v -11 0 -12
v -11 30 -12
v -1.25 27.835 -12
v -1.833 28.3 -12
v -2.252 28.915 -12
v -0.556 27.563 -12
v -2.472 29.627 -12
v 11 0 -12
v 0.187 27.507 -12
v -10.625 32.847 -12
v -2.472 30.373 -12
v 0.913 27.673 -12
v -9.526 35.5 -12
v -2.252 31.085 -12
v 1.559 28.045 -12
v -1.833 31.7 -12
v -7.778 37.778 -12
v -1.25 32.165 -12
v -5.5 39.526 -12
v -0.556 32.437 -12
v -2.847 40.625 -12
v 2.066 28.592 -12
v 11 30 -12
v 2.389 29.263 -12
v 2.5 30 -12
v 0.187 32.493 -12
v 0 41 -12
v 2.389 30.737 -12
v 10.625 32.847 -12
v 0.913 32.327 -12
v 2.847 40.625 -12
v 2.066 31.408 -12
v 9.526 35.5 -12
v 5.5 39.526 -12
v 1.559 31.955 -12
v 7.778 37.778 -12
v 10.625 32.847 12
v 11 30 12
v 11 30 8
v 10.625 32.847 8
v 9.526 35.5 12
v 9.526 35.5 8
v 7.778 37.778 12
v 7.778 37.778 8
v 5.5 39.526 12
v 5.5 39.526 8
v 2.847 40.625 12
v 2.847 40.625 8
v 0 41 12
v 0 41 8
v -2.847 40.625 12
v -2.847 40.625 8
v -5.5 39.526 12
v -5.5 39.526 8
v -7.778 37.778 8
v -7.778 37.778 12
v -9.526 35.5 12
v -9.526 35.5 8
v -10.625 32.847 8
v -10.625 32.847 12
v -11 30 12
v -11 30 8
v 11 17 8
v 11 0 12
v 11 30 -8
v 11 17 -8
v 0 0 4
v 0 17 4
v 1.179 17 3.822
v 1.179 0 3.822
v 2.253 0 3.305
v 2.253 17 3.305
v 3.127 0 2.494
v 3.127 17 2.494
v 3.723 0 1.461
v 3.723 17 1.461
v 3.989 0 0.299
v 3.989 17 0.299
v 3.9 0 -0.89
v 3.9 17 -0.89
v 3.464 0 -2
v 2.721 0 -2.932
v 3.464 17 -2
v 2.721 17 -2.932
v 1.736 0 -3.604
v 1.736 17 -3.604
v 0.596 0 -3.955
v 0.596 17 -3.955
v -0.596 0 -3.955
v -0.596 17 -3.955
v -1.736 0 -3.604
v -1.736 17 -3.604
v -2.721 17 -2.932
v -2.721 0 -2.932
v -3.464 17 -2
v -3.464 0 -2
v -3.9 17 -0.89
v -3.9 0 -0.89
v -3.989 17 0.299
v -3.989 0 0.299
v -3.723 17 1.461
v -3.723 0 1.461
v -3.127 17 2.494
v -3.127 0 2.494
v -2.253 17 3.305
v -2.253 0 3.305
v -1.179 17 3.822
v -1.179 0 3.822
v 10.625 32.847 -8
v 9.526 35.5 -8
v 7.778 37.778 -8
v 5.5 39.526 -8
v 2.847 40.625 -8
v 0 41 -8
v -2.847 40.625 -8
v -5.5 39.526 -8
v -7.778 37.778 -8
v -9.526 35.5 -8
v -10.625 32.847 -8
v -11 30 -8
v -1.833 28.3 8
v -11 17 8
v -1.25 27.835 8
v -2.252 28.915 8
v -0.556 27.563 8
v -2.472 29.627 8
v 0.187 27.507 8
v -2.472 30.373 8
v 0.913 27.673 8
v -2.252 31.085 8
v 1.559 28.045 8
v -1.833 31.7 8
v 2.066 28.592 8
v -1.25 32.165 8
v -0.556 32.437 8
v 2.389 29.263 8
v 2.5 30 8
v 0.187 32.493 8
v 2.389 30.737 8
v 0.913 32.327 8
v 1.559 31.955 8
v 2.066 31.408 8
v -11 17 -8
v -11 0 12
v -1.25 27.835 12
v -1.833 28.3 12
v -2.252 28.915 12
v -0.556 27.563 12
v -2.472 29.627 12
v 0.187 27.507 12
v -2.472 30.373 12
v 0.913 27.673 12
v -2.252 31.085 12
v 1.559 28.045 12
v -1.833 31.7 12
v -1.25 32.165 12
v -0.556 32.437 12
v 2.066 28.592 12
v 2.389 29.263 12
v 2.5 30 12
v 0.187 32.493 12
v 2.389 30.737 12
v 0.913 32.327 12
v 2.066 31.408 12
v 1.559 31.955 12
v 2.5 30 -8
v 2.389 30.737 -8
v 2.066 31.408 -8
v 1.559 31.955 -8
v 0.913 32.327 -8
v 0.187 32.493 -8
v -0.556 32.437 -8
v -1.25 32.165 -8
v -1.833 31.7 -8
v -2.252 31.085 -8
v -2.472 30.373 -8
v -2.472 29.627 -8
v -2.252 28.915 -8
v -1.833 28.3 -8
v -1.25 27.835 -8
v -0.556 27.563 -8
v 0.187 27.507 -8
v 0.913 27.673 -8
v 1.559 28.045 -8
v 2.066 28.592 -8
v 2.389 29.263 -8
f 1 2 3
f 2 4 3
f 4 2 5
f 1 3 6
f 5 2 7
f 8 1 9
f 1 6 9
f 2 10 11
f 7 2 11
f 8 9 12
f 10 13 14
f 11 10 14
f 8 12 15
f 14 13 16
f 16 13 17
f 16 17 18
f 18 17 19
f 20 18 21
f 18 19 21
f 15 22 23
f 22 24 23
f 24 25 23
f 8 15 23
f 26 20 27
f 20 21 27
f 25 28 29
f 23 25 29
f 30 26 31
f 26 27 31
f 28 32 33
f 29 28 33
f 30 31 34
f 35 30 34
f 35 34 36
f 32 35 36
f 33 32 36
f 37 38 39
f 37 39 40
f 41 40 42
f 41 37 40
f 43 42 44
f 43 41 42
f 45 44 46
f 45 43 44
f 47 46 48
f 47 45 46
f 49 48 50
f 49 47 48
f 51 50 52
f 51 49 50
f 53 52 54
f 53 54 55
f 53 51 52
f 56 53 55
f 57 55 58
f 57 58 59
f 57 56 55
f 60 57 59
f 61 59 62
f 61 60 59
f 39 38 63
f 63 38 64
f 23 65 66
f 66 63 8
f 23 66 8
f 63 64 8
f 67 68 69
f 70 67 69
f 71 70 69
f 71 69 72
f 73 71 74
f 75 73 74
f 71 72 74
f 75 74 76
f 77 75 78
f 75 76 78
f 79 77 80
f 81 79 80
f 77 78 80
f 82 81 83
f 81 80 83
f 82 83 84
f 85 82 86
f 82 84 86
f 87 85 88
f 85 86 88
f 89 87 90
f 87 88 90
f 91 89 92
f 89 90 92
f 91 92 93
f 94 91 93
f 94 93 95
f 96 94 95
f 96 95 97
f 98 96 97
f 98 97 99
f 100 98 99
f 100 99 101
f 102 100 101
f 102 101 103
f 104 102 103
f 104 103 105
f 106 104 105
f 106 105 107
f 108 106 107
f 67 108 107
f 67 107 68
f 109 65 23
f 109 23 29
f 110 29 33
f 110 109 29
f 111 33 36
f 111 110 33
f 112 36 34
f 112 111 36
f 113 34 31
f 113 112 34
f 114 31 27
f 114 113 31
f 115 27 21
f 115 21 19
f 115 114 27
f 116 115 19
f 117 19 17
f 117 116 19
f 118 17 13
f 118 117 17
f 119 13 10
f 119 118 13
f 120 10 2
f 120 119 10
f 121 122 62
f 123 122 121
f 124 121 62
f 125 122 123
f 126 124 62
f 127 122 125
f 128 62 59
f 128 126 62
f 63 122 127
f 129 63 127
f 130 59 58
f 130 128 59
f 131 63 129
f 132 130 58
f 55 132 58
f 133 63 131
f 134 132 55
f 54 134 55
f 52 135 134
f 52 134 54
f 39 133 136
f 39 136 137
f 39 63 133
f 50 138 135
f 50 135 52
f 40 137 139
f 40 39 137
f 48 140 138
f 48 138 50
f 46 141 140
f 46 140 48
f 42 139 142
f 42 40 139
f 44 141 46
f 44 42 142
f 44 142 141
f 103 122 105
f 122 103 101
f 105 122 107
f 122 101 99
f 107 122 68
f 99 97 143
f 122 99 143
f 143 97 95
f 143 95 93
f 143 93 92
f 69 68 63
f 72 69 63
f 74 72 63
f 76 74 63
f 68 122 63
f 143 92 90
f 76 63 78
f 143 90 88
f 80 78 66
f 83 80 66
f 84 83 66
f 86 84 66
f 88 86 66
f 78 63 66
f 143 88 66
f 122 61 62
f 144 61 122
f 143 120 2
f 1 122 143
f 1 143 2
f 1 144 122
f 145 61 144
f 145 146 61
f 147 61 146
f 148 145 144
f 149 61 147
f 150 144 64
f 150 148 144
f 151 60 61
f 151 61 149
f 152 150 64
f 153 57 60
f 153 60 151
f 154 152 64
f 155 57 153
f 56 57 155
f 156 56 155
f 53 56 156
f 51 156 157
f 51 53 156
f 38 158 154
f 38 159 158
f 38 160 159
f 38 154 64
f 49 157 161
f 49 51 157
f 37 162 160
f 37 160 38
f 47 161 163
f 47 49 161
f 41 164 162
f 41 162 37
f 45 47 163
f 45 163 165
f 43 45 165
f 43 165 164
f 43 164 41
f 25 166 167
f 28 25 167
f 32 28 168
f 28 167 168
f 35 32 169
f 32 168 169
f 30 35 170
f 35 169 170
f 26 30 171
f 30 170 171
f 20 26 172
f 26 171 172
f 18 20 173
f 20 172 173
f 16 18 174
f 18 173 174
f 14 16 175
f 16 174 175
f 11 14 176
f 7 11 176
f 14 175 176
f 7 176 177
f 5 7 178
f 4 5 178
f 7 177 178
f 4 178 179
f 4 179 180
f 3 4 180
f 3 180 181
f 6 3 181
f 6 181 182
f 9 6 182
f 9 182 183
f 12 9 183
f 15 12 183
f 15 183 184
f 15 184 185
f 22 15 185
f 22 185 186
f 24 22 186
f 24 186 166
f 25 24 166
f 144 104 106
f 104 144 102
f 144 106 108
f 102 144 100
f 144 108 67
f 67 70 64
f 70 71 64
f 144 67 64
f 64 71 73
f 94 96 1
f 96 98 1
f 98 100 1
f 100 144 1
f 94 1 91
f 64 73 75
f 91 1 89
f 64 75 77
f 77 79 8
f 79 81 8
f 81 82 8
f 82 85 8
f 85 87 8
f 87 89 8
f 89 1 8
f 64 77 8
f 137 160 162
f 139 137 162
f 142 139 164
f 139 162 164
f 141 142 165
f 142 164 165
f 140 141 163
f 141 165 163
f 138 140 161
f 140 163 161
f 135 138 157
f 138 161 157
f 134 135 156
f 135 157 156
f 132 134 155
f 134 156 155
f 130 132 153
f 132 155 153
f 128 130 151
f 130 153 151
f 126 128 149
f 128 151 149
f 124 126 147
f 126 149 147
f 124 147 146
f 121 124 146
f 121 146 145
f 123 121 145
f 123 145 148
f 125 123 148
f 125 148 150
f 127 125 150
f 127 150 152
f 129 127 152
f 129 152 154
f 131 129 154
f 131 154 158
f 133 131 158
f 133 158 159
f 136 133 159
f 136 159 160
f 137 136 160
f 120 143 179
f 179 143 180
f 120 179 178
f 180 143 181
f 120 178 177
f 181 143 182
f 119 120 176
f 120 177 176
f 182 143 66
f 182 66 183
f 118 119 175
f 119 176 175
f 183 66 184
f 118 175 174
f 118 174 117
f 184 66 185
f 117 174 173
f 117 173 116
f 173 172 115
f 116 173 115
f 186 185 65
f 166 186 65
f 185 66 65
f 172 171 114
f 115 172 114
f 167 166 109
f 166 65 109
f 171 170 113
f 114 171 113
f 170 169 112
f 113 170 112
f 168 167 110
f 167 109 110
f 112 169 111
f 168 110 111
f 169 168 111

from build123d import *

# Parameters (mm, degrees)
CROQUIS1_W              = 22
CROQUIS1_H              = 24
SALIENTE_EXTRUIR1_DEPTH = 30
SALIENTE_EXTRUIR2_DEPTH = 24
CROQUIS4_W              = 16
CROQUIS4_H              = 27.551854113
CORTAR_EXTRUIR1_DEPTH   = 24
CROQUIS5_R              = 4
CORTAR_EXTRUIR2_DEPTH   = 24
CROQUIS6_R              = 2.5
CORTAR_EXTRUIR3_DEPTH   = 49.764741361


with BuildPart() as part:
    # Croquis1 → Saliente-Extruir1 (new body)
    with BuildSketch(Plane(origin=(0, 0, 0), x_dir=(1, 0, 0), z_dir=(0, 1, 0))):
        Rectangle(CROQUIS1_W, CROQUIS1_H)
    extrude(amount=SALIENTE_EXTRUIR1_DEPTH)

    # Croquis3 → Saliente-Extruir2 (add)
    with BuildSketch(Plane.XY.offset(12)):
        with BuildLine():
            Line((-11, 30), (11, 30))
            ThreePointArc((11, 30), (0, 41), (-11, 30))
        make_face()
    extrude(amount=-SALIENTE_EXTRUIR2_DEPTH)

    # Croquis4 → Cortar-Extruir1 (cut)
    with BuildSketch(Plane(origin=(11, 0, 0), x_dir=(0, 0, -1), z_dir=(1, 0, 0))):
        with Locations((0, 30.775927057)):
            Rectangle(CROQUIS4_W, CROQUIS4_H)
    extrude(amount=-CORTAR_EXTRUIR1_DEPTH, mode=Mode.SUBTRACT)

    # Croquis5 → Cortar-Extruir2 (cut)
    with BuildSketch(Plane(origin=(0, 17, 0), x_dir=(1, 0, 0), z_dir=(0, 1, 0))):
        with Locations(Location((0, 0, 0), (0, 0, 270))):
            Circle(CROQUIS5_R)
    extrude(amount=-CORTAR_EXTRUIR2_DEPTH, mode=Mode.SUBTRACT)

    # Croquis6 → Cortar-Extruir3 (cut, through all)
    with BuildSketch(Plane.XY.offset(12)):
        with Locations((0, 30)):
            Circle(CROQUIS6_R)
    extrude(amount=-CORTAR_EXTRUIR3_DEPTH, mode=Mode.SUBTRACT)


solid = part.part
